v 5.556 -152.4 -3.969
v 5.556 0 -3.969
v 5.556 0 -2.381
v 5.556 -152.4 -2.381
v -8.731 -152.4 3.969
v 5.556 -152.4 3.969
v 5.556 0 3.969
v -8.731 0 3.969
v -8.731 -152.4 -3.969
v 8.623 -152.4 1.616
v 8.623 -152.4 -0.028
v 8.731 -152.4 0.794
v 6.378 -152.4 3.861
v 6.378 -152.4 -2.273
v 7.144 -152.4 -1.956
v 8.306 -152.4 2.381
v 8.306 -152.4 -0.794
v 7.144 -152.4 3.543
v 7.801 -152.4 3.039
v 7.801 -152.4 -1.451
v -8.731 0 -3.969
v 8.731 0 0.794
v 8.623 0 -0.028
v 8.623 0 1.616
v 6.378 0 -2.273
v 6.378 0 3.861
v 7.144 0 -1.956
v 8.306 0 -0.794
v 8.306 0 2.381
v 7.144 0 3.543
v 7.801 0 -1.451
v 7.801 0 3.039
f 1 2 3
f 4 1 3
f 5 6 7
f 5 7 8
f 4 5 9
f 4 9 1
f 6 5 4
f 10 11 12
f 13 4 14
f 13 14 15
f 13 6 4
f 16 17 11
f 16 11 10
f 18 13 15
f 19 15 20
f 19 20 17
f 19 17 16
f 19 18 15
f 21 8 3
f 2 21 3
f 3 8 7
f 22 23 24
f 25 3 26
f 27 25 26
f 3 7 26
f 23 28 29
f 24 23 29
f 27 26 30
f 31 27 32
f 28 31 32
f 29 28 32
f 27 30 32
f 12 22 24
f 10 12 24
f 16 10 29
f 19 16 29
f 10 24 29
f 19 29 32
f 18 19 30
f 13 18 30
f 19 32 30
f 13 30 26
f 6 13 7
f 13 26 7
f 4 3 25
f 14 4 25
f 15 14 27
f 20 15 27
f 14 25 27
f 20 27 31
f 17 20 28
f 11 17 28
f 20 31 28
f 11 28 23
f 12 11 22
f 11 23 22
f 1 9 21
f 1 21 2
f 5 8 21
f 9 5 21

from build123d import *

# Parameters (mm, degrees)
F1_DEPTH = 152.4


with BuildPart() as f1:
    # F0 (on Front) → F1 (new body)
    with BuildSketch(Plane.XZ):
        with BuildLine():
            Line((-8.73125, 3.96875), (-8.73125, -3.96875))
            Line((-8.73125, -3.96875), (5.55625, -3.96875))
            Line((5.55625, -3.96875), (5.55625, -2.38125))
            ThreePointArc((5.55625, -2.38125), (7.801314, -1.451314), (8.73125, 0.79375))
            ThreePointArc((8.73125, 0.79375), (7.801314, 3.038814), (5.55625, 3.96875))
            Line((5.55625, 3.96875), (-8.73125, 3.96875))
        make_face()
    extrude(amount=F1_DEPTH)


solid = f1.part
